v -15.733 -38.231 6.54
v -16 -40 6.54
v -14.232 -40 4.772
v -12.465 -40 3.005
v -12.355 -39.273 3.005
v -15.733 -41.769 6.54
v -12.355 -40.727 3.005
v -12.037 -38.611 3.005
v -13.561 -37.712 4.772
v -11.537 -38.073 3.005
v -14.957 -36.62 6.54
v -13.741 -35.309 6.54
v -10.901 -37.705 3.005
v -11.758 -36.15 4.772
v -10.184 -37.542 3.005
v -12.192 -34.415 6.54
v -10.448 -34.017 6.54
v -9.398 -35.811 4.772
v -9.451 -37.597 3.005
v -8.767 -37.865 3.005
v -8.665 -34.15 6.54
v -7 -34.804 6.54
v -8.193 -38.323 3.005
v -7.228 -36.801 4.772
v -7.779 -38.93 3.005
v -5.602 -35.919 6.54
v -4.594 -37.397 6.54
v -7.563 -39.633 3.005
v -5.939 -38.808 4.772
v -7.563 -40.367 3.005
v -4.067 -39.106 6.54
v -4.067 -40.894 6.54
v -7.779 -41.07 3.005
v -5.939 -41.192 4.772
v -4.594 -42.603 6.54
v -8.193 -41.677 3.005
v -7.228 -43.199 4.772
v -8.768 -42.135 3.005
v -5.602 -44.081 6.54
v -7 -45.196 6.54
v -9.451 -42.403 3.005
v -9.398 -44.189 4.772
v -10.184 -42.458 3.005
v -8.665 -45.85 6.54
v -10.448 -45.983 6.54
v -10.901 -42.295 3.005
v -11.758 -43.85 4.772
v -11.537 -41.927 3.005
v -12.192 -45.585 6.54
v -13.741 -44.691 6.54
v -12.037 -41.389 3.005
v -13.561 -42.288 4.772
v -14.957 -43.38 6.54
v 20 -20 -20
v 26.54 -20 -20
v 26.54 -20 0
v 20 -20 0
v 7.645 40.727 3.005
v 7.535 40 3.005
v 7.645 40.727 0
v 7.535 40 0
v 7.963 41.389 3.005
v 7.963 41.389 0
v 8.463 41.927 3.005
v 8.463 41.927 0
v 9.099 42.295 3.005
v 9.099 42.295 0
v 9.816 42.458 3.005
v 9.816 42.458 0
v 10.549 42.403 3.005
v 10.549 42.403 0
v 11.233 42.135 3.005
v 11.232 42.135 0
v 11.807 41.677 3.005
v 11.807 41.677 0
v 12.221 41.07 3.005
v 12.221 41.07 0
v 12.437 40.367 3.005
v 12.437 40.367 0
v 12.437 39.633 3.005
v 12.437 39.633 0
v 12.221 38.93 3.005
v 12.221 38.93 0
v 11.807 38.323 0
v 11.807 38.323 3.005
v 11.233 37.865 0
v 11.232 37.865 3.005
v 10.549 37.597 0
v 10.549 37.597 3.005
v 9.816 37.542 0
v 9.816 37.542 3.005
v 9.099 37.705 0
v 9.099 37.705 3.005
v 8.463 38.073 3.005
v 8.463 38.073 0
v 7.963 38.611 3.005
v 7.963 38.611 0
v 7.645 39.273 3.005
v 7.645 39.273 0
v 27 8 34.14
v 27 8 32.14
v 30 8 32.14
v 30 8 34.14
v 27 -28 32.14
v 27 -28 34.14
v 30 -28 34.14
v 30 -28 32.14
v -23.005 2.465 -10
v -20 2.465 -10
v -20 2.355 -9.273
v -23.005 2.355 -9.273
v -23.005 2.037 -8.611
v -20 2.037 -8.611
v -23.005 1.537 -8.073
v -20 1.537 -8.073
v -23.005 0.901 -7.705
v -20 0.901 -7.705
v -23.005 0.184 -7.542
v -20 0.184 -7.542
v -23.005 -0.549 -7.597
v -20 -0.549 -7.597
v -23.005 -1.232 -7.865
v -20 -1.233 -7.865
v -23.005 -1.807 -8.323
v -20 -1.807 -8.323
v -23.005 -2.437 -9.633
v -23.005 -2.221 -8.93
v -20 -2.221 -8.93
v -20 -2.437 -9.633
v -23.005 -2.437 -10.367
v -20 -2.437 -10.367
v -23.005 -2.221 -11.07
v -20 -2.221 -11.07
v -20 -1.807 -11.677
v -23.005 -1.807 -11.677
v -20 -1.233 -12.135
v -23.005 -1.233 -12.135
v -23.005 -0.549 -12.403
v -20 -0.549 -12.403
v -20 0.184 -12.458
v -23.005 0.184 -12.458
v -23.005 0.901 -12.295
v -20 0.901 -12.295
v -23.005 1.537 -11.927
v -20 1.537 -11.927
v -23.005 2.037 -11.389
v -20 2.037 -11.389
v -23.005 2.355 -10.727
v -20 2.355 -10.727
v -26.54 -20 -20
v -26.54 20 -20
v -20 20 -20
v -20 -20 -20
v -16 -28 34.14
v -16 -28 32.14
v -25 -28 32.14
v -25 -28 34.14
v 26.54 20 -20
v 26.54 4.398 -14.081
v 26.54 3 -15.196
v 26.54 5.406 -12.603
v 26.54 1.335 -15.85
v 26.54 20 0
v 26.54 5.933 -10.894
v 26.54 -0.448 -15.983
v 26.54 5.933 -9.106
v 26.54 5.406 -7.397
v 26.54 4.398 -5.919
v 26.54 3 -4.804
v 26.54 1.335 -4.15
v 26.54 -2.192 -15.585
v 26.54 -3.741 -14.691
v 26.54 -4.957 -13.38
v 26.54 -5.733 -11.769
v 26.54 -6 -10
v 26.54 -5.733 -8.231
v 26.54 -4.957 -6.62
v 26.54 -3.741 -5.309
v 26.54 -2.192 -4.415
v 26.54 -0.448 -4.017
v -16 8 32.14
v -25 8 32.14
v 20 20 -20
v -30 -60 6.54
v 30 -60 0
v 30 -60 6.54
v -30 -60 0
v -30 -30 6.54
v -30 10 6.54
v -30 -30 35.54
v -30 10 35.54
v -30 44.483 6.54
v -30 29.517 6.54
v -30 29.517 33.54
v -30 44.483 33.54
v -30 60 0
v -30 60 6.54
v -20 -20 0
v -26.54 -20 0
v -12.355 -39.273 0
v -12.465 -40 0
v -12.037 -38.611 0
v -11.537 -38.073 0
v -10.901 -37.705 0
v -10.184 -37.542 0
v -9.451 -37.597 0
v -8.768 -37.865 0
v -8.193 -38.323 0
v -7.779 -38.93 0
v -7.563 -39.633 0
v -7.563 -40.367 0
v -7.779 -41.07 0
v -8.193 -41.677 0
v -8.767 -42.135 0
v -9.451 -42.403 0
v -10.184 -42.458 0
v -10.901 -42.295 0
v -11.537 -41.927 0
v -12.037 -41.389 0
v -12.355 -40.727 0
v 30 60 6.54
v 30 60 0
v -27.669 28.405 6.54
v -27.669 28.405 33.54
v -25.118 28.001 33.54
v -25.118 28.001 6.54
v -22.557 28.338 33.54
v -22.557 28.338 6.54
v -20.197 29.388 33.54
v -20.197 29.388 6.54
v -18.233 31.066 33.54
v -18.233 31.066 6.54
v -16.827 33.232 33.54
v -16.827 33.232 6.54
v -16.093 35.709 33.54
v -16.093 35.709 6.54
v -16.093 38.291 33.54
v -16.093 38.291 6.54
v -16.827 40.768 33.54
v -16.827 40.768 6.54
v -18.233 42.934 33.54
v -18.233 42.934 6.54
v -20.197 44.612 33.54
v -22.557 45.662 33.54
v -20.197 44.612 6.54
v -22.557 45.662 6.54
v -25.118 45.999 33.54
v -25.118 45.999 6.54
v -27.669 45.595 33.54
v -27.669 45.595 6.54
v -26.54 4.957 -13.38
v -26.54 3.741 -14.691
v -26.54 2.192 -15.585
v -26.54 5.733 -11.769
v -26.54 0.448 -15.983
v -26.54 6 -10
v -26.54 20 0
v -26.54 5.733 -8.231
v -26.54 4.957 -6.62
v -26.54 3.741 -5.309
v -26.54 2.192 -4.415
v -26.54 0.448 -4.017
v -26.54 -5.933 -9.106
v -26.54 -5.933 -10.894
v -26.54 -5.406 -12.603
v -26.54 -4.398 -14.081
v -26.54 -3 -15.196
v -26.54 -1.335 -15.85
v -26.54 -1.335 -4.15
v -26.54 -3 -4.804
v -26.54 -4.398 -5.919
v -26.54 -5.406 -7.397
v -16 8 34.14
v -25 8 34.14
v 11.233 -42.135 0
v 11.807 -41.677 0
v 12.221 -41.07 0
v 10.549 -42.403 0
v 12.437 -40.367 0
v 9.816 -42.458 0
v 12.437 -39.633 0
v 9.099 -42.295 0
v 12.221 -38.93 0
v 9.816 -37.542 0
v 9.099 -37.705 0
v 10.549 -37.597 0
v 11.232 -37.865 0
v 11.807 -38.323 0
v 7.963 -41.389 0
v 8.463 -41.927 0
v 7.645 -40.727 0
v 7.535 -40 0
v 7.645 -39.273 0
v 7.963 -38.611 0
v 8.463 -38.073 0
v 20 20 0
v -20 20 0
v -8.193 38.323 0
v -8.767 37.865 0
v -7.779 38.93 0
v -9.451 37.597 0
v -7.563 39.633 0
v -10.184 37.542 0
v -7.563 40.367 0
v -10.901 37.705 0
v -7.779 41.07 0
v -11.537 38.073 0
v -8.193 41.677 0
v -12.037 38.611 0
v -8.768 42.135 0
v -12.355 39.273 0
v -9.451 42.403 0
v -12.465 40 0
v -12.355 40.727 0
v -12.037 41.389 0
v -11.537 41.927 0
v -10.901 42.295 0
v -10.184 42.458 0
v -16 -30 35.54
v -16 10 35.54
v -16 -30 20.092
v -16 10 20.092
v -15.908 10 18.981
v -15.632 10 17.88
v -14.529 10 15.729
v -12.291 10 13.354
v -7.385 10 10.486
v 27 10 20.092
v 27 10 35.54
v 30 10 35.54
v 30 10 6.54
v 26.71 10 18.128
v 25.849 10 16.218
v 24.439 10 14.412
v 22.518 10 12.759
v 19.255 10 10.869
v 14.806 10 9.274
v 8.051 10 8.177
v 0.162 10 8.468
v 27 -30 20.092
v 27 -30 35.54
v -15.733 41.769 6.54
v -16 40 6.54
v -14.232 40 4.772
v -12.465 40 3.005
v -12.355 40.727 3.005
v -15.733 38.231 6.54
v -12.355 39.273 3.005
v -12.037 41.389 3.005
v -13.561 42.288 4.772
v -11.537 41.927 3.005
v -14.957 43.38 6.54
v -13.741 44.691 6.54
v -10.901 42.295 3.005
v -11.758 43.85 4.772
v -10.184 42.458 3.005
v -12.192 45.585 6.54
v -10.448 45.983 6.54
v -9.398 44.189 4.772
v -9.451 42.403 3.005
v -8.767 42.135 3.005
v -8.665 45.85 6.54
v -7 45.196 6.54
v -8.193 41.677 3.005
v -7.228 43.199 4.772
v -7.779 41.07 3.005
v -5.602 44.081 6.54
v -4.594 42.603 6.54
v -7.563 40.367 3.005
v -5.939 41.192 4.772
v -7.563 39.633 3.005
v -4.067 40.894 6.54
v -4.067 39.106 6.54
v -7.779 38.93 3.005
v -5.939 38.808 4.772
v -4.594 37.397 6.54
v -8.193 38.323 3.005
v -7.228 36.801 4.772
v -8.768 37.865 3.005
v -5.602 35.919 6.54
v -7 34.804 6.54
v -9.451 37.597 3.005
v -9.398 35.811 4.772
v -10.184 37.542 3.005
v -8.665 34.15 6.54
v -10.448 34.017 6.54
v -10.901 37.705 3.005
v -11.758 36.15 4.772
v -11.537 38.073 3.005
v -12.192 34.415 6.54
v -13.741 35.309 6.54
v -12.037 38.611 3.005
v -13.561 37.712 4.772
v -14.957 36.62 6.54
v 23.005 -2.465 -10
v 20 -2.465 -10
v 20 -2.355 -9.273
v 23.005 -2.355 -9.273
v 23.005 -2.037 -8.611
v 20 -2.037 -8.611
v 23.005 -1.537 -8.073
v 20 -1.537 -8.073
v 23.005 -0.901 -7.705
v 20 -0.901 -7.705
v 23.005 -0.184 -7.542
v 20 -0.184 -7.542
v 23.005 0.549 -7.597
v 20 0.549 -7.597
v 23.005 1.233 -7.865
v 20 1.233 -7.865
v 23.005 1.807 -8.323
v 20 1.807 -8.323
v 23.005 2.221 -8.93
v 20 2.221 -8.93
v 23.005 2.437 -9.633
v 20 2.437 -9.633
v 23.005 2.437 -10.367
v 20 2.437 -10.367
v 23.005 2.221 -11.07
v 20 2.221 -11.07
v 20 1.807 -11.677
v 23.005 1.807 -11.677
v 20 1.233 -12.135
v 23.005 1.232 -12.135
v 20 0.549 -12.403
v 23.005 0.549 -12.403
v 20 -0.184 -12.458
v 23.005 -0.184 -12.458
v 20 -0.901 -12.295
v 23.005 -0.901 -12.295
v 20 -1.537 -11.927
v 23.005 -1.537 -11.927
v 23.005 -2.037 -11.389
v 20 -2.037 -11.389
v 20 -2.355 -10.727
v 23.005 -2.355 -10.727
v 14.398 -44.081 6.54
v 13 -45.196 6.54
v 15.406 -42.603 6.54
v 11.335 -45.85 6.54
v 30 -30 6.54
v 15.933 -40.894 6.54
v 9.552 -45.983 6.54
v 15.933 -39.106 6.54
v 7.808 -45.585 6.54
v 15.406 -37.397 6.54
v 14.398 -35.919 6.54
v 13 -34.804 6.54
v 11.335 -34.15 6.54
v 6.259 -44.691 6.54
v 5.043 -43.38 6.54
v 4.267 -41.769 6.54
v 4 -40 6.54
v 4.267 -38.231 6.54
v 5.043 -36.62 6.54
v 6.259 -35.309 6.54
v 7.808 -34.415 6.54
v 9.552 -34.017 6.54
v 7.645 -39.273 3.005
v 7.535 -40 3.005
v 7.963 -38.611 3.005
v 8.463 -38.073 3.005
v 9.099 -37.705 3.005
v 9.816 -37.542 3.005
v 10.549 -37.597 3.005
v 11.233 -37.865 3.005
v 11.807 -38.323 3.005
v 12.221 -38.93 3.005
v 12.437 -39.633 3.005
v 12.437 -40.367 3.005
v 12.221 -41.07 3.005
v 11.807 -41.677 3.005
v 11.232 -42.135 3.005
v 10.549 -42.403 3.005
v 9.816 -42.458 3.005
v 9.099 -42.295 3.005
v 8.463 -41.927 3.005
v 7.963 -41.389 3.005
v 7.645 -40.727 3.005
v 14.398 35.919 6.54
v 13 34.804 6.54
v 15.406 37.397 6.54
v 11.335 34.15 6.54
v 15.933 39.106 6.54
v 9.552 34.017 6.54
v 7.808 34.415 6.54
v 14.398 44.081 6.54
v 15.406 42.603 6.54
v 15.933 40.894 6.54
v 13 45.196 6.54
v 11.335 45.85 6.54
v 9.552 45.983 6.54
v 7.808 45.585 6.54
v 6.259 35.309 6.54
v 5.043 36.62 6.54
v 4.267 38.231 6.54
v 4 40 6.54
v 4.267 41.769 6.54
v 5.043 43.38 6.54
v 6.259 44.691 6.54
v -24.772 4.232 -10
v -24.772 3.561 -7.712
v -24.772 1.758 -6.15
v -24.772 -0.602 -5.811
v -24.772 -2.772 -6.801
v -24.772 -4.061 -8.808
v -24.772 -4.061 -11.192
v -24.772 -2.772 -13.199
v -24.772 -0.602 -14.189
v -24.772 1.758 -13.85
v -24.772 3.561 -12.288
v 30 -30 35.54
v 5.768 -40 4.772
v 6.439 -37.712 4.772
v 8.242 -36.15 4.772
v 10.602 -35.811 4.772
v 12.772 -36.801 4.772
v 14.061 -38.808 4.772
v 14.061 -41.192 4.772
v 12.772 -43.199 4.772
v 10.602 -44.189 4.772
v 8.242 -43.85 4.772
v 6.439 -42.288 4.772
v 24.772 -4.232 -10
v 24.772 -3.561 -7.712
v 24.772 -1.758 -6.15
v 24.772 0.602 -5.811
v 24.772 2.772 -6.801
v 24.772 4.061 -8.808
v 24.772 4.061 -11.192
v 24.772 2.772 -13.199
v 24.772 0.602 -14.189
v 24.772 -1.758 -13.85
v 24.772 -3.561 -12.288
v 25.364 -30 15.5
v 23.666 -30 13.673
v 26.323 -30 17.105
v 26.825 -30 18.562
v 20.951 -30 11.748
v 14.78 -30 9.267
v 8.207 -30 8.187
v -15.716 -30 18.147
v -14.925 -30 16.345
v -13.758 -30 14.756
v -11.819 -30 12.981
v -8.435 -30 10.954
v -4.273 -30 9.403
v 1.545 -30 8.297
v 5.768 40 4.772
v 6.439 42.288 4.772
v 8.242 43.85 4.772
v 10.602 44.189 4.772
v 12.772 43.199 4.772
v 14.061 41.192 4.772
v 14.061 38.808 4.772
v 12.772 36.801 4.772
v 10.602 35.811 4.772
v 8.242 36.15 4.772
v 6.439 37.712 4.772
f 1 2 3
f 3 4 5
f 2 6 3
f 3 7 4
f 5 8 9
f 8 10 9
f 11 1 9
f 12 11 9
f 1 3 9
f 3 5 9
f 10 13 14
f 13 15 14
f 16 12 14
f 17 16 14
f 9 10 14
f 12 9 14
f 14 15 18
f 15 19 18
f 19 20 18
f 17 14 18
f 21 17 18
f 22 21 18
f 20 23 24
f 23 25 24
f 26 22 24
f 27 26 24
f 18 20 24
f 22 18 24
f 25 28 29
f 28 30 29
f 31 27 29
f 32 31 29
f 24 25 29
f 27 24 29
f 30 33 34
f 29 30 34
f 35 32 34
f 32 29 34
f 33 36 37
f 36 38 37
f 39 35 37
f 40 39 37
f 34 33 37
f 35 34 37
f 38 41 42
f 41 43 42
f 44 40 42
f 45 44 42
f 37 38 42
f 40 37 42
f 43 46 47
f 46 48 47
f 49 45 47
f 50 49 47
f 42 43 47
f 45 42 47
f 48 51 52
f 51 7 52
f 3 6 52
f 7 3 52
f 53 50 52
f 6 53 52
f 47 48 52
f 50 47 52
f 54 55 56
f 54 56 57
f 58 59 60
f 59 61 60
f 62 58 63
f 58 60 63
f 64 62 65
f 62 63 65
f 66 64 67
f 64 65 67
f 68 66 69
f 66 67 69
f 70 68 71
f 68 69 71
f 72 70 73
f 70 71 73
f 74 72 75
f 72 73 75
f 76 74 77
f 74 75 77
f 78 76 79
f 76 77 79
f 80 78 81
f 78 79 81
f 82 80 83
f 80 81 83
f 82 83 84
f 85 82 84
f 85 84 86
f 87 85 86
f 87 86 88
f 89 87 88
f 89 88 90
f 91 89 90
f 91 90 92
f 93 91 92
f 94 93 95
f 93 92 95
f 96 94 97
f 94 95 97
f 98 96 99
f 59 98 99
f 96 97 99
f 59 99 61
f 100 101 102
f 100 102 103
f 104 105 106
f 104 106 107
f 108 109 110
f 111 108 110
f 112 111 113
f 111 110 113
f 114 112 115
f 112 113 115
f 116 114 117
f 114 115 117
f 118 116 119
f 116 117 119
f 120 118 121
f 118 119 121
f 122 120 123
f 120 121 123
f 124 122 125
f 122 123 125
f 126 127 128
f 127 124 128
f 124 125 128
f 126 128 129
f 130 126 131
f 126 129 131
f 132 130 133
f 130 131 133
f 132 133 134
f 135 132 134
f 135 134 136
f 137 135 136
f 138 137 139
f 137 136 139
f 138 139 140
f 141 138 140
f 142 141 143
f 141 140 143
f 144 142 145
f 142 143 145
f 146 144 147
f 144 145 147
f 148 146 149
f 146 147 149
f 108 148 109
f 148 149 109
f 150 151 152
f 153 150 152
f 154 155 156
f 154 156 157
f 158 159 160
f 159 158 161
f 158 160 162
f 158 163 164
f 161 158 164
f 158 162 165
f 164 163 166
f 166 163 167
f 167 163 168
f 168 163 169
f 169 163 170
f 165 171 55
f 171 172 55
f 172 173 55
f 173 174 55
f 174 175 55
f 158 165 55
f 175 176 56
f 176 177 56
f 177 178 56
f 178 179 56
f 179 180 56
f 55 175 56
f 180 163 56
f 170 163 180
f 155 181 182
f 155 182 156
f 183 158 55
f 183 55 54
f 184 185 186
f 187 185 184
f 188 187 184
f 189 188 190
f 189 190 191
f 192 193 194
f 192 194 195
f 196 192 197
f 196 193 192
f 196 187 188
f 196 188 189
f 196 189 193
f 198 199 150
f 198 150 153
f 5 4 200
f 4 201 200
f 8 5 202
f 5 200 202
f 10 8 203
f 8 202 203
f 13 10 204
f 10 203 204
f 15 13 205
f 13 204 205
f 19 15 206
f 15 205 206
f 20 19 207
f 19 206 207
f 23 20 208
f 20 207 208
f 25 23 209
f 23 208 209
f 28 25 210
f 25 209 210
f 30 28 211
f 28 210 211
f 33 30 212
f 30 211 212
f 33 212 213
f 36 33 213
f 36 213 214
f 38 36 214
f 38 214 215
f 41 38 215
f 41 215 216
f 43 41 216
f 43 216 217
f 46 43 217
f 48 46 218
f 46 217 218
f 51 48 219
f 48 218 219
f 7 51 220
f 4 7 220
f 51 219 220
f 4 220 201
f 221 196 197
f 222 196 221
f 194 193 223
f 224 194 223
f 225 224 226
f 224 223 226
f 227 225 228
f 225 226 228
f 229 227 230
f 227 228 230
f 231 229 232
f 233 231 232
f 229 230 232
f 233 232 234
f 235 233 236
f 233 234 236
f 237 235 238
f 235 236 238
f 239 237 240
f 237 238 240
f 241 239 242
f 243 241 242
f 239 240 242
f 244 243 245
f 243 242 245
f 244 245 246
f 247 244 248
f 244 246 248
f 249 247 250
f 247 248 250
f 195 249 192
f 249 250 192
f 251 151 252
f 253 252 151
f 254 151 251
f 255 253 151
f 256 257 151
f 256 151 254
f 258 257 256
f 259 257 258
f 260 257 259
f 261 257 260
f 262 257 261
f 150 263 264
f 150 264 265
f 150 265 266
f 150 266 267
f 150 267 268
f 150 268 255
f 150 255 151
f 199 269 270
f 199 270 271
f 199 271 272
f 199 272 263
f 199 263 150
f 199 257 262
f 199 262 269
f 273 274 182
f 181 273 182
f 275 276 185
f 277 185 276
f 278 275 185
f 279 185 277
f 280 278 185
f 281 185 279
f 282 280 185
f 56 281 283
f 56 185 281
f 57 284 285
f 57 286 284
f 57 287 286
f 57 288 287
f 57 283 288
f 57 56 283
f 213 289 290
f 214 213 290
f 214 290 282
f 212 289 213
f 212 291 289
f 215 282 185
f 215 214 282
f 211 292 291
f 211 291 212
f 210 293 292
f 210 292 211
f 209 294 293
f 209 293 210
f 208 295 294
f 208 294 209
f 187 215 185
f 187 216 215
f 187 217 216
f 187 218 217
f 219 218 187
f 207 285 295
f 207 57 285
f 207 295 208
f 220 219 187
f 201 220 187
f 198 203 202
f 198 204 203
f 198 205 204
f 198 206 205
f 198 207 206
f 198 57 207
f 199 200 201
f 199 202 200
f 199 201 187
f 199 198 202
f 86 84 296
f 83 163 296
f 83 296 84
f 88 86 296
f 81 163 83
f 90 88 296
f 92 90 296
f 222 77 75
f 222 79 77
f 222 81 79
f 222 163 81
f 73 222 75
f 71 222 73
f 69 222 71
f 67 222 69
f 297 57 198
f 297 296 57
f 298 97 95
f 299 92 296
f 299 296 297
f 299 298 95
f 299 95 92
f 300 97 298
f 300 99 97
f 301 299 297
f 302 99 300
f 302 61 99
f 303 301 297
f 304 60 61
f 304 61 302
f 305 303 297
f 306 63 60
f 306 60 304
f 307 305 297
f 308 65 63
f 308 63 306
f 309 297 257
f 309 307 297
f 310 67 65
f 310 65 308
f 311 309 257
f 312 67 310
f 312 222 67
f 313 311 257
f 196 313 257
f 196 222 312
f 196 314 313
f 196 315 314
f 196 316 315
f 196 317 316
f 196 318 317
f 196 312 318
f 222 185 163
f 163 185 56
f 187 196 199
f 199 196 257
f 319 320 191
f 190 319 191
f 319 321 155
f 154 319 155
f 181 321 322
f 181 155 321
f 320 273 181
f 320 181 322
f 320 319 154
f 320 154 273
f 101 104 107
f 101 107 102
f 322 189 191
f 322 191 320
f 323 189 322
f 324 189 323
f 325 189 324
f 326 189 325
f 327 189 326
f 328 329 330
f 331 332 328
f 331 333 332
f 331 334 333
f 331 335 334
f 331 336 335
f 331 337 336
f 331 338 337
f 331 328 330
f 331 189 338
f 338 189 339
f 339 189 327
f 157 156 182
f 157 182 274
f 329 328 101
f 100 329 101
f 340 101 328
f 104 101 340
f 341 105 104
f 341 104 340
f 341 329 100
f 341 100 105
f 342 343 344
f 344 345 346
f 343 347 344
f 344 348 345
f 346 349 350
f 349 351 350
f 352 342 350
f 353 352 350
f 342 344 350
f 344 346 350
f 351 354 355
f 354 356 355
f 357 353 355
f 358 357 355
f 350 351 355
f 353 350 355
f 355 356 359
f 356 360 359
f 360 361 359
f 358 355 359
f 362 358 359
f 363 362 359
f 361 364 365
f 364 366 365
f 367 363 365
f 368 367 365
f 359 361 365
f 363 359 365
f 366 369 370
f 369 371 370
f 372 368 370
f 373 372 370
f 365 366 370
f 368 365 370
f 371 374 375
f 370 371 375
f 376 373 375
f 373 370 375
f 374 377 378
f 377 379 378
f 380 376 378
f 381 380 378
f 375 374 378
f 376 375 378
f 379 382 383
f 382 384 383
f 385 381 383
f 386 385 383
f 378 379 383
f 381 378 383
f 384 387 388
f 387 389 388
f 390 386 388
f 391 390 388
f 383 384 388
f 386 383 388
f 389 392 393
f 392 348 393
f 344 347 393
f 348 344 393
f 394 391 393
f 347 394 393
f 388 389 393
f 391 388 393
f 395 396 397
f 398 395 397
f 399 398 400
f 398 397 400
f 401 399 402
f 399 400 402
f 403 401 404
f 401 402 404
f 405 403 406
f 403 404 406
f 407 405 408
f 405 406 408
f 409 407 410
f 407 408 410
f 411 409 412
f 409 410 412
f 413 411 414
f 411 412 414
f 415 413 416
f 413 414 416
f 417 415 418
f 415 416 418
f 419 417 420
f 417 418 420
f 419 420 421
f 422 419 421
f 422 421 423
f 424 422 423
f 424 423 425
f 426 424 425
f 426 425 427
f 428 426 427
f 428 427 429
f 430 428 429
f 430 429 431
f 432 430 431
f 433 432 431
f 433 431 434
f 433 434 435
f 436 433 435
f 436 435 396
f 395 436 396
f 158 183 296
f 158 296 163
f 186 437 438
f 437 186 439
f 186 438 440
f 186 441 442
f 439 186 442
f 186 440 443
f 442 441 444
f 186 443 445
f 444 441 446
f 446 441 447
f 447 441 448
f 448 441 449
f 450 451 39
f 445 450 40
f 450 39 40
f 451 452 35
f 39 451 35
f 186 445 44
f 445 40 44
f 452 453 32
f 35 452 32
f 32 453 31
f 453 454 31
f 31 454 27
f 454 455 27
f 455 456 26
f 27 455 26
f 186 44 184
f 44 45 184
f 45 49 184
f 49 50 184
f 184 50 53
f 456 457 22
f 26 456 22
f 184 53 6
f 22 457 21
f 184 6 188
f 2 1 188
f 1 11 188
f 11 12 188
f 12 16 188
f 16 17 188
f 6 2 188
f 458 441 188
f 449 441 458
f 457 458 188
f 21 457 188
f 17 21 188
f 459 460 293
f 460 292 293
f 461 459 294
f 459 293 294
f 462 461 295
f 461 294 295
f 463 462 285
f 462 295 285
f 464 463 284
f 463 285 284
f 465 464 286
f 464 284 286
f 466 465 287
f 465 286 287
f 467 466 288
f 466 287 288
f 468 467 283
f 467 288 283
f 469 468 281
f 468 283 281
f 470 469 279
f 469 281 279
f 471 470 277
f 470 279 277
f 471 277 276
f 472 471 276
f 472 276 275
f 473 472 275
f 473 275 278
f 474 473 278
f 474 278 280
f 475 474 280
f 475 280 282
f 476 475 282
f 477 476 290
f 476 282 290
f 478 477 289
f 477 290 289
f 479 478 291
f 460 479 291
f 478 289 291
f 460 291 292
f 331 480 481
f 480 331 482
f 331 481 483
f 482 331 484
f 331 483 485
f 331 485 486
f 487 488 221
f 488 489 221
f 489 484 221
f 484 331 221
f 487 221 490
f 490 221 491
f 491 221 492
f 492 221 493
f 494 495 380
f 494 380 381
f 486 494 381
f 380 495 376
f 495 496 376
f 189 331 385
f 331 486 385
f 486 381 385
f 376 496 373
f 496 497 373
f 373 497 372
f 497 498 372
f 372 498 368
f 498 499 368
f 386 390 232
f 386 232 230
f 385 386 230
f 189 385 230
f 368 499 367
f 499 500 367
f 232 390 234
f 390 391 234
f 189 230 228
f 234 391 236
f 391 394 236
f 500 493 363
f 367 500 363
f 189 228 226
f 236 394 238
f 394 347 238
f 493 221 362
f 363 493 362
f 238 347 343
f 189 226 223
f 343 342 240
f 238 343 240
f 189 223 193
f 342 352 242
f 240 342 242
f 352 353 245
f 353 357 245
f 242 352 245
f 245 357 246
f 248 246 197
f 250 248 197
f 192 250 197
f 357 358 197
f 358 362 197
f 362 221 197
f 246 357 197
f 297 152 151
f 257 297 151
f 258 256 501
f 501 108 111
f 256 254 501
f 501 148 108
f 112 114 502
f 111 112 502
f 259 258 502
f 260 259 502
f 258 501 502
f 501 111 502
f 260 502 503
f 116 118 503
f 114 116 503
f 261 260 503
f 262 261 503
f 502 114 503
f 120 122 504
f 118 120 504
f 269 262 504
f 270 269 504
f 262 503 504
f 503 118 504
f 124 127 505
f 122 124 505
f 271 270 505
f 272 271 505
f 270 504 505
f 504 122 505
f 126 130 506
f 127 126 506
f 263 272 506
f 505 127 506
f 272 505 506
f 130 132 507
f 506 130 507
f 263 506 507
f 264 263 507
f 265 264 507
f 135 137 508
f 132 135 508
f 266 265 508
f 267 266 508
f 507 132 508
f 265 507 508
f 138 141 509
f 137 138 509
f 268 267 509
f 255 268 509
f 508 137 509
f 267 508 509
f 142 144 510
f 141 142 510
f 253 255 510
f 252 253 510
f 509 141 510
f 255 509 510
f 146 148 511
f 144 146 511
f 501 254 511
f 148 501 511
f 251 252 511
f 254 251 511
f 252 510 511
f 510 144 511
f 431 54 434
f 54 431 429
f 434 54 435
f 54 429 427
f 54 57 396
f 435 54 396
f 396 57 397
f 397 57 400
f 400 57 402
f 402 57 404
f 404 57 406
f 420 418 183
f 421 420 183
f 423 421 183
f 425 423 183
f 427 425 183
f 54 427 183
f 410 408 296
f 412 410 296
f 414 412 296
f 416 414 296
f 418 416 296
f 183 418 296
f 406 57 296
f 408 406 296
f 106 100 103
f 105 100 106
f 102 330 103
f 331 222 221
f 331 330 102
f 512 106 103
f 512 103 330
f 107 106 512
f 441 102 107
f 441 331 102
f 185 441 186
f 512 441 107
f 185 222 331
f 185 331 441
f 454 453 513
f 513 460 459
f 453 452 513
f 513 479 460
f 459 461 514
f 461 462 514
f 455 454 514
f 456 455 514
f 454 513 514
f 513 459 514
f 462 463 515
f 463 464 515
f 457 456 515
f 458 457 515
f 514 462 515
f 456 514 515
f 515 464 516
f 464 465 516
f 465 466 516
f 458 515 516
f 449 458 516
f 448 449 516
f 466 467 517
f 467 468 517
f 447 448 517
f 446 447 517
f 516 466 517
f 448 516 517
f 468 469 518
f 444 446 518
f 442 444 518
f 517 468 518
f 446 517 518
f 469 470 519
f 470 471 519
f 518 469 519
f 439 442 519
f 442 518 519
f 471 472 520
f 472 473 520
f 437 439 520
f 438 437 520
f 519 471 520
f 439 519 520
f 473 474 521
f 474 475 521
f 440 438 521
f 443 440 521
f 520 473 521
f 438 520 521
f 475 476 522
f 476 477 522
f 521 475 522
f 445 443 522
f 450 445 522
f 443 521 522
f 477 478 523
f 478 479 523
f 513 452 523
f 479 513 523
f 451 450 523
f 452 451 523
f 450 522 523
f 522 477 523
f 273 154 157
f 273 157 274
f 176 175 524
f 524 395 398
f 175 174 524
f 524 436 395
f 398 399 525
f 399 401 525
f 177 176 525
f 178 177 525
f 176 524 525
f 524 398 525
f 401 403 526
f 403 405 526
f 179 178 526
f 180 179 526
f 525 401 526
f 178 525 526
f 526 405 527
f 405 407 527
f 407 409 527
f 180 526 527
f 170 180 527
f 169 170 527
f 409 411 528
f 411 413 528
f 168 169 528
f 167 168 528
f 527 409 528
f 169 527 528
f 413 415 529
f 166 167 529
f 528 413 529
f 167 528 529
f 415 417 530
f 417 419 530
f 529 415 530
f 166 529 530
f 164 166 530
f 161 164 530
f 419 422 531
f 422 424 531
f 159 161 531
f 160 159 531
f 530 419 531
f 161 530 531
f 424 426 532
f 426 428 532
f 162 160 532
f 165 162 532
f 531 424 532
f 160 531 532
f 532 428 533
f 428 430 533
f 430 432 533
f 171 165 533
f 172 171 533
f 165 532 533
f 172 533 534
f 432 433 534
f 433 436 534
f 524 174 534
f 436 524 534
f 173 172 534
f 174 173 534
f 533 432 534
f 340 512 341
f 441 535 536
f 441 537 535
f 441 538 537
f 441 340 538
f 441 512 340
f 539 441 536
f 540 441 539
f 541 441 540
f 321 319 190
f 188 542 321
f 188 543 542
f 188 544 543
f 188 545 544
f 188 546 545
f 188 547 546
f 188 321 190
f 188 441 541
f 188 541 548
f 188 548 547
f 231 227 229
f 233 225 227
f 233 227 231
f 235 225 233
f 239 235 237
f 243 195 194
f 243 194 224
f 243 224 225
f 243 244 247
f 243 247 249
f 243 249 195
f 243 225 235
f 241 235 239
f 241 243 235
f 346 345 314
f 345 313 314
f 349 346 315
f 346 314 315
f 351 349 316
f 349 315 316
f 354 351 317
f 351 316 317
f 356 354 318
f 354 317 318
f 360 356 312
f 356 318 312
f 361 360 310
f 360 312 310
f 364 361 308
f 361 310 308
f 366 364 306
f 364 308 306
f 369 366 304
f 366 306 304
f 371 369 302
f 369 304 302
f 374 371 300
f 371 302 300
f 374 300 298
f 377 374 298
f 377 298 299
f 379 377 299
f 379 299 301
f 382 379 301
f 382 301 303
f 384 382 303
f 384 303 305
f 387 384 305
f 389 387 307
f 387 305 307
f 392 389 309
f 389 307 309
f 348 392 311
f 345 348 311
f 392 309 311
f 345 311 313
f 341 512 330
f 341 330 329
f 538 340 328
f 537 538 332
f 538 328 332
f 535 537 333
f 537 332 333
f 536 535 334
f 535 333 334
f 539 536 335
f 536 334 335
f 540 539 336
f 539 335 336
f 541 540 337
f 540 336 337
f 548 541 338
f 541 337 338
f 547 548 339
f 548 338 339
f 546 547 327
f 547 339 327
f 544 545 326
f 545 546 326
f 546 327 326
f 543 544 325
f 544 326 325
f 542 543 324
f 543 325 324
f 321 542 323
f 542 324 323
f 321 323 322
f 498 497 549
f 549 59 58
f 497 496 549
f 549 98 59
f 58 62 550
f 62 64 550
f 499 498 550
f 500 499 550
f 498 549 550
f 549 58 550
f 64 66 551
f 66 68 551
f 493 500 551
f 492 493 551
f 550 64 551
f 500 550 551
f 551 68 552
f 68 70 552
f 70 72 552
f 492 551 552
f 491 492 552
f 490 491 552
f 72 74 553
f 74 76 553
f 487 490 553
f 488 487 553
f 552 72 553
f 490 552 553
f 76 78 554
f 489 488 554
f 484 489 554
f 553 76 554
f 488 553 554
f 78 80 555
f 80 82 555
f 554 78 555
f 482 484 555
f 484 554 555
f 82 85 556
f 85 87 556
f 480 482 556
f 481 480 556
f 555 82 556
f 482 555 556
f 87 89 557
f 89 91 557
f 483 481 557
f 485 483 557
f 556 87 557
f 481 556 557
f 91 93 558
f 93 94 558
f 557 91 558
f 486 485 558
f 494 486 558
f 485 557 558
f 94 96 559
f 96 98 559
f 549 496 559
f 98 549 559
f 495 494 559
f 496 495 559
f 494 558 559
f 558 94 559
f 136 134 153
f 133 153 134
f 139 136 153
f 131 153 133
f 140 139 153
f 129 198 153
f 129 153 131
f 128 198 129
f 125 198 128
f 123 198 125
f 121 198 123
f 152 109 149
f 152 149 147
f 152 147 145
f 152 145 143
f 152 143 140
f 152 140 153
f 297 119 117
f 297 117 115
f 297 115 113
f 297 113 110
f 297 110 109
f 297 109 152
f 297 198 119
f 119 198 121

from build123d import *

# Parameters (mm, degrees)
BOSS_EXTRUDE1_DEPTH                             = 6.54
BOSS_EXTRUDE4_DEPTH                             = 27.000000000000004
CSK_FOR_M3_FLAT_HEAD_MACHINE_SCREW2_D           = 4.93
CSK_FOR_M3_FLAT_HEAD_MACHINE_SCREW2_CSINK_D     = 12
CSK_FOR_M3_FLAT_HEAD_MACHINE_SCREW2_CSINK_ANGLE = 90
BOSS_EXTRUDE5_DEPTH                             = 20
BOSS_EXTRUDE6_DEPTH                             = 28.999999999999996
CUT_EXTRUDE1_REACH                              = 86.042
SKETCH18_RX                                     = 21.5
SKETCH18_RY                                     = 11.999999999999996
CUT_EXTRUDE2_REACH                              = 89.09
CUT_EXTRUDE3_DEPTH                              = 8.999999999999996
CUT_EXTRUDE4_DEPTH                              = 8.999999999999996
CSK_FOR_M3_FLAT_HEAD_MACHINE_SCREW4_D           = 4.93
CSK_FOR_M3_FLAT_HEAD_MACHINE_SCREW4_DEPTH       = 6.54
CSK_FOR_M3_FLAT_HEAD_MACHINE_SCREW4_CSINK_D     = 12
CSK_FOR_M3_FLAT_HEAD_MACHINE_SCREW4_CSINK_ANGLE = 90
CSK_FOR_M3_FLAT_HEAD_MACHINE_SCREW5_D           = 4.93
CSK_FOR_M3_FLAT_HEAD_MACHINE_SCREW5_CSINK_D     = 12
CSK_FOR_M3_FLAT_HEAD_MACHINE_SCREW5_CSINK_ANGLE = 90


with BuildPart() as part:
    # Sketch1 → Boss-Extrude1 (new body)
    with BuildSketch(Plane.XY):
        Polygon((-30.000000000000004, 59.99999999999999), (29.999999999999996, 59.99999999999999), (30.00000000000001, -60.00000000000001), (-29.99999999999999, -60.00000000000001), align=None)
    extrude(amount=BOSS_EXTRUDE1_DEPTH)

    # Sketch7 → Boss-Extrude4 (add)
    with BuildSketch(Plane.XY.offset(6.54)):
        with BuildLine():
            Line((-30.000000000000004, 44.48331477354787), (-30.000000000000004, 29.516685226452115))
            ThreePointArc((-30.000000000000004, 29.516685226452115), (-15.999999999999986, 36.99999999999999), (-30.000000000000004, 44.48331477354787))
        make_face()
    extrude(amount=BOSS_EXTRUDE4_DEPTH)

    # CSK for M3 Flat Head Machine Screw2 (through all)
    with Locations(Plane(origin=(-10, -40, 6.54), x_dir=(1, 0, 0), z_dir=(0, 0, 1))):
        with Locations((0, 0), (20, 0), (0, 80), (20, 80)):
            CounterSinkHole(CSK_FOR_M3_FLAT_HEAD_MACHINE_SCREW2_D / 2, CSK_FOR_M3_FLAT_HEAD_MACHINE_SCREW2_CSINK_D / 2, counter_sink_angle=CSK_FOR_M3_FLAT_HEAD_MACHINE_SCREW2_CSINK_ANGLE)

    # Sketch10 → Boss-Extrude5 (add)
    with BuildSketch(Plane(origin=(0, 0, 0), x_dir=(-1, 0, 0), z_dir=(0, 0, -1))):
        Polygon((20, 20), (26.540000000000003, 20), (26.540000000000006, -20.000000000000007), (20, -20.000000000000007), align=None)
        Polygon((-20, -20), (-20, 19.999999999999993), (-26.540000000000003, 19.999999999999993), (-26.54, -20), align=None)
    extrude(amount=BOSS_EXTRUDE5_DEPTH)

    # Sketch17 → Boss-Extrude6 (add)
    with BuildSketch(Plane.XY.offset(6.54)):
        Polygon((-30, 9.999999999999995), (30.000000000000014, 9.999999999999995), (30.00000000000001, -30.000000000000007), (-29.999999999999996, -30.000000000000007), align=None)
    extrude(amount=BOSS_EXTRUDE6_DEPTH)

    # Sketch18 → Cut-Extrude1 (cut, up to next)
    with BuildSketch(Plane(origin=(0, 9.999999999999995, 0), x_dir=(1, 0, 0), z_dir=(0, 1, 0)), mode=Mode.PRIVATE) as cut_extrude1_sk1:
        with Locations((5.500000000000008, -20.091951128620167)):
            Ellipse(SKETCH18_RX, SKETCH18_RY)
    cut_extrude1_tool1 = extrude(cut_extrude1_sk1.sketch, amount=-CUT_EXTRUDE1_REACH, mode=Mode.PRIVATE) & part.part
    add(cut_extrude1_tool1.solids().sort_by_distance((5.5, 10, 20.091951))[0], mode=Mode.SUBTRACT)

    # Sketch21 → Cut-Extrude2 (cut, up to next)
    with BuildSketch(Plane.XY.offset(35.53999999999999), mode=Mode.PRIVATE) as cut_extrude2_sk1:
        Polygon((-15.99999999999999, 9.999999999999995), (27.00000000000001, 9.999999999999995), (27.00000000000002, -30.000000000000007), (-15.999999999999986, -30.000000000000007), align=None)
    cut_extrude2_tool1 = extrude(cut_extrude2_sk1.sketch, amount=-CUT_EXTRUDE2_REACH, mode=Mode.PRIVATE) & part.part
    add(cut_extrude2_tool1.solids().sort_by_distance((5.5, -10, 35.54))[0], mode=Mode.SUBTRACT)

    # Sketch23 → Cut-Extrude3 (cut)
    with BuildSketch(Plane(origin=(-15.99999999999999, -1.39e-15, 0), x_dir=(0, 0, -1), z_dir=(1, 9e-17, 0))):
        Polygon((-34.139999999999986, 7.9999999999999964), (-32.13999999999999, 7.9999999999999964), (-32.139999999999986, -28.000000000000007), (-34.139999999999986, -28), align=None)
    extrude(amount=-CUT_EXTRUDE3_DEPTH, mode=Mode.SUBTRACT)

    # Sketch24 → Cut-Extrude4 (cut)
    with BuildSketch(Plane.ZY.offset(-27.000000000000014)):
        Polygon((32.13999999999999, 7.9999999999999885), (34.14, 7.9999999999999885), (34.14, -28.00000000000001), (32.14, -28.00000000000001), align=None)
    extrude(amount=-CUT_EXTRUDE4_DEPTH, mode=Mode.SUBTRACT)

    # CSK for M3 Flat Head Machine Screw4
    with Locations(Plane(origin=(-26.54, 0, -10), x_dir=(0, -1, 0), z_dir=(-1, 0, 0))):
        with Locations((0, 0)):
            CounterSinkHole(CSK_FOR_M3_FLAT_HEAD_MACHINE_SCREW4_D / 2, CSK_FOR_M3_FLAT_HEAD_MACHINE_SCREW4_CSINK_D / 2, depth=CSK_FOR_M3_FLAT_HEAD_MACHINE_SCREW4_DEPTH, counter_sink_angle=CSK_FOR_M3_FLAT_HEAD_MACHINE_SCREW4_CSINK_ANGLE)

    # CSK for M3 Flat Head Machine Screw5 (through all)
    with Locations(Plane(origin=(26.54, 0, -10), x_dir=(0, 1, 0), z_dir=(1, 0, 0))):
        with Locations((0, 0)):
            CounterSinkHole(CSK_FOR_M3_FLAT_HEAD_MACHINE_SCREW5_D / 2, CSK_FOR_M3_FLAT_HEAD_MACHINE_SCREW5_CSINK_D / 2, counter_sink_angle=CSK_FOR_M3_FLAT_HEAD_MACHINE_SCREW5_CSINK_ANGLE)


solid = part.part
